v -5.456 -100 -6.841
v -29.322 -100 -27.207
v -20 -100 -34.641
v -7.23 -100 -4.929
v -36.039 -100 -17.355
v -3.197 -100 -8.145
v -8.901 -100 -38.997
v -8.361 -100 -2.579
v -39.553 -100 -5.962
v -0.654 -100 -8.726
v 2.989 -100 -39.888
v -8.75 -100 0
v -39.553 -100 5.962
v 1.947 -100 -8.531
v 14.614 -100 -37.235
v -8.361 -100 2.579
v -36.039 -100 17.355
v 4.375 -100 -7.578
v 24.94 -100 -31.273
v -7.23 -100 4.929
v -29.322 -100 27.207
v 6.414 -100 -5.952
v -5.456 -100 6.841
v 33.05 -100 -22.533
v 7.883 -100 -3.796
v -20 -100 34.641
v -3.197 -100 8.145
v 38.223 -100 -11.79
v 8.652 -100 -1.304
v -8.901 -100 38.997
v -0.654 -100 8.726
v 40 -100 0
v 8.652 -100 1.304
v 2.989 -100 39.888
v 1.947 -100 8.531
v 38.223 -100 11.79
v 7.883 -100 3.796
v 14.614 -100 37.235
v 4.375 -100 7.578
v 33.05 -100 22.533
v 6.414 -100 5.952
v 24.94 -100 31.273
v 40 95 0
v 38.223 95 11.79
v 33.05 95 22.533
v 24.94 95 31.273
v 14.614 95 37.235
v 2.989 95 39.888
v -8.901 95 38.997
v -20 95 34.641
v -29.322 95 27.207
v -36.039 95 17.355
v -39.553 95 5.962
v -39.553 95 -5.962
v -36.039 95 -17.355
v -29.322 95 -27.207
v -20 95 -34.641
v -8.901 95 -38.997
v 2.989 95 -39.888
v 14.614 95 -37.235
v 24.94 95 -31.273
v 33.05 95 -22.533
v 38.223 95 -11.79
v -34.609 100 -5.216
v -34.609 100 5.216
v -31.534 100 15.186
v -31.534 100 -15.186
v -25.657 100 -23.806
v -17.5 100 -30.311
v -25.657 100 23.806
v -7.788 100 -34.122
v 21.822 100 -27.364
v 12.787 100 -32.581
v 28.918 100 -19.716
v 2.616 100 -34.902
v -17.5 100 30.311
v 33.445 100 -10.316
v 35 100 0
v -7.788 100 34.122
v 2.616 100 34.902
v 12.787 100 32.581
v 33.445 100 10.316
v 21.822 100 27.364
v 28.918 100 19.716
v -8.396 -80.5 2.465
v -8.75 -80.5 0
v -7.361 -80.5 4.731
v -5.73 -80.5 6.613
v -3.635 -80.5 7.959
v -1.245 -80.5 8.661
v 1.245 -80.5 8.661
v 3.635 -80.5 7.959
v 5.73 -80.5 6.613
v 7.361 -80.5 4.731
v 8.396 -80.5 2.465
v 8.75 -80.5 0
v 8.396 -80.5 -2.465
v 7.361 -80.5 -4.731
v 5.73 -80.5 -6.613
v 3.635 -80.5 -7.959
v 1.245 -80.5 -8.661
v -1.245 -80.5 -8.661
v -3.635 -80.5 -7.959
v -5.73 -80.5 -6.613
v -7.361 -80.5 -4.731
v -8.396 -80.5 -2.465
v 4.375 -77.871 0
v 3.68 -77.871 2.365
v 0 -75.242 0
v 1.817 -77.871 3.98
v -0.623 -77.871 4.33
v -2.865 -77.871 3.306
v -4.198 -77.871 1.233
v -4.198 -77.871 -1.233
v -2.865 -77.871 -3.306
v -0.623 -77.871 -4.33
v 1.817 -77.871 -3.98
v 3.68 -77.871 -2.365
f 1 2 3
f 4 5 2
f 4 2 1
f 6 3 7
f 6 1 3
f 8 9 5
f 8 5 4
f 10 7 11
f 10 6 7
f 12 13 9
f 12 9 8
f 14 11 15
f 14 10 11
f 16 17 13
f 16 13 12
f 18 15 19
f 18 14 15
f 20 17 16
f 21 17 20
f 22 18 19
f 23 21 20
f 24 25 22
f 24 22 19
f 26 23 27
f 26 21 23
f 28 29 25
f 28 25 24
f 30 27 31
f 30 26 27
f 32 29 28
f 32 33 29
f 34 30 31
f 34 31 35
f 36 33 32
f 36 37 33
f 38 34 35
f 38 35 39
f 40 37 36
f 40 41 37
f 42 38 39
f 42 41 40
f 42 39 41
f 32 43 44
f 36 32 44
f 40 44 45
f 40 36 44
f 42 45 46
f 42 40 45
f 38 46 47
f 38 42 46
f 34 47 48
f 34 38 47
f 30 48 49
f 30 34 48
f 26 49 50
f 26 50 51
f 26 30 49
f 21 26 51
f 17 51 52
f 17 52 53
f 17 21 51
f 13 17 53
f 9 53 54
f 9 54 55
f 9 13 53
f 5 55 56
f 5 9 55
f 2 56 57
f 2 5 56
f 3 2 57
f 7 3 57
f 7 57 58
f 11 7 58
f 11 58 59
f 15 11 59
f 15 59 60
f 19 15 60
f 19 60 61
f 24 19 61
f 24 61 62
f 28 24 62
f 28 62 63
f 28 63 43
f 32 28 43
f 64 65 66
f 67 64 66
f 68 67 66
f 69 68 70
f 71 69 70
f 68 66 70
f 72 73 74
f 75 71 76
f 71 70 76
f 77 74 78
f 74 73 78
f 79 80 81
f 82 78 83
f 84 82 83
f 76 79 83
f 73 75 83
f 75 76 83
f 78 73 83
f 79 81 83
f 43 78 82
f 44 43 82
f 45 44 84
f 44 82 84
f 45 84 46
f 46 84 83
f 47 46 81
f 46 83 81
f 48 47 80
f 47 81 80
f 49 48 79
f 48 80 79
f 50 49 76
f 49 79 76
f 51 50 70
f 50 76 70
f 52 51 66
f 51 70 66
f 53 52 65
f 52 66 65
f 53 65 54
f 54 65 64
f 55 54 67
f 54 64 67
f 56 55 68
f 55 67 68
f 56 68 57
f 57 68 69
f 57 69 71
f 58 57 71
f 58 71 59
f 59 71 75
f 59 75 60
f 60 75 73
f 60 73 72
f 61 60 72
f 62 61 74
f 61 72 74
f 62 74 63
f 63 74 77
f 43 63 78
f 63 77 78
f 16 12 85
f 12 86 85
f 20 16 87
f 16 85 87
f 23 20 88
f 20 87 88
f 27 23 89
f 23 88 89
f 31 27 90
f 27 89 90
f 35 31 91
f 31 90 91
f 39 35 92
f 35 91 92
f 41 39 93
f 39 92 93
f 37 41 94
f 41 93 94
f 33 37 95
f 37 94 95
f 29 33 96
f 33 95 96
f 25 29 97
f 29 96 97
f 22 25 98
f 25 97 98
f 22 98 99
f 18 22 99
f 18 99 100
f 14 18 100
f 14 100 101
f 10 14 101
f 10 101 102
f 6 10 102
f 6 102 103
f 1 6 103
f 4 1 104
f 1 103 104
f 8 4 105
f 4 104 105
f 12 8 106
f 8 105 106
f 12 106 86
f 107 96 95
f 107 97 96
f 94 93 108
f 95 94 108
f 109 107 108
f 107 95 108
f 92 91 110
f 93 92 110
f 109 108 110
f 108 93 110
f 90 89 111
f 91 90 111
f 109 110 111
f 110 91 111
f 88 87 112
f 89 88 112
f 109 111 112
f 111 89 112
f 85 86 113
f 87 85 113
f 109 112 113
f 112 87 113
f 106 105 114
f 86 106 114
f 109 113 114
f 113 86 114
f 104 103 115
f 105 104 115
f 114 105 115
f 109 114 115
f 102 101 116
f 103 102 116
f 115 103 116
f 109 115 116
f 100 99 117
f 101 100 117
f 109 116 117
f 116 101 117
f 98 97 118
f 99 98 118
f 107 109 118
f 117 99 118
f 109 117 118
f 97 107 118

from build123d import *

# Parameters (mm, degrees)
F0_R     = 40
F1_DEPTH = 100
F2_SIZE  = 5
F4_D     = 17.5
F4_DEPTH = 19.5
F4_TIP   = 5.2575304165


with BuildPart() as f1:
    # F0 (on Front) → F1 (new body, symmetric)
    with BuildSketch(Plane.XZ):
        Circle(F0_R)
    extrude(amount=F1_DEPTH, both=True)

    # F2
    f2_edges = [f1.edges().sort_by_distance(p)[0] for p in [
        (-40, 100, 0),
    ]]
    chamfer(f2_edges, length=F2_SIZE)

    # F4
    with Locations(Plane.XZ.offset(100)):
        with Locations((0, 0)):
            Hole(F4_D / 2, depth=F4_DEPTH)
            with Locations((0, 0, -(F4_DEPTH + F4_TIP / 2))):  # 118° drill point
                Cone(0, F4_D / 2, F4_TIP, mode=Mode.SUBTRACT)


solid = f1.part
